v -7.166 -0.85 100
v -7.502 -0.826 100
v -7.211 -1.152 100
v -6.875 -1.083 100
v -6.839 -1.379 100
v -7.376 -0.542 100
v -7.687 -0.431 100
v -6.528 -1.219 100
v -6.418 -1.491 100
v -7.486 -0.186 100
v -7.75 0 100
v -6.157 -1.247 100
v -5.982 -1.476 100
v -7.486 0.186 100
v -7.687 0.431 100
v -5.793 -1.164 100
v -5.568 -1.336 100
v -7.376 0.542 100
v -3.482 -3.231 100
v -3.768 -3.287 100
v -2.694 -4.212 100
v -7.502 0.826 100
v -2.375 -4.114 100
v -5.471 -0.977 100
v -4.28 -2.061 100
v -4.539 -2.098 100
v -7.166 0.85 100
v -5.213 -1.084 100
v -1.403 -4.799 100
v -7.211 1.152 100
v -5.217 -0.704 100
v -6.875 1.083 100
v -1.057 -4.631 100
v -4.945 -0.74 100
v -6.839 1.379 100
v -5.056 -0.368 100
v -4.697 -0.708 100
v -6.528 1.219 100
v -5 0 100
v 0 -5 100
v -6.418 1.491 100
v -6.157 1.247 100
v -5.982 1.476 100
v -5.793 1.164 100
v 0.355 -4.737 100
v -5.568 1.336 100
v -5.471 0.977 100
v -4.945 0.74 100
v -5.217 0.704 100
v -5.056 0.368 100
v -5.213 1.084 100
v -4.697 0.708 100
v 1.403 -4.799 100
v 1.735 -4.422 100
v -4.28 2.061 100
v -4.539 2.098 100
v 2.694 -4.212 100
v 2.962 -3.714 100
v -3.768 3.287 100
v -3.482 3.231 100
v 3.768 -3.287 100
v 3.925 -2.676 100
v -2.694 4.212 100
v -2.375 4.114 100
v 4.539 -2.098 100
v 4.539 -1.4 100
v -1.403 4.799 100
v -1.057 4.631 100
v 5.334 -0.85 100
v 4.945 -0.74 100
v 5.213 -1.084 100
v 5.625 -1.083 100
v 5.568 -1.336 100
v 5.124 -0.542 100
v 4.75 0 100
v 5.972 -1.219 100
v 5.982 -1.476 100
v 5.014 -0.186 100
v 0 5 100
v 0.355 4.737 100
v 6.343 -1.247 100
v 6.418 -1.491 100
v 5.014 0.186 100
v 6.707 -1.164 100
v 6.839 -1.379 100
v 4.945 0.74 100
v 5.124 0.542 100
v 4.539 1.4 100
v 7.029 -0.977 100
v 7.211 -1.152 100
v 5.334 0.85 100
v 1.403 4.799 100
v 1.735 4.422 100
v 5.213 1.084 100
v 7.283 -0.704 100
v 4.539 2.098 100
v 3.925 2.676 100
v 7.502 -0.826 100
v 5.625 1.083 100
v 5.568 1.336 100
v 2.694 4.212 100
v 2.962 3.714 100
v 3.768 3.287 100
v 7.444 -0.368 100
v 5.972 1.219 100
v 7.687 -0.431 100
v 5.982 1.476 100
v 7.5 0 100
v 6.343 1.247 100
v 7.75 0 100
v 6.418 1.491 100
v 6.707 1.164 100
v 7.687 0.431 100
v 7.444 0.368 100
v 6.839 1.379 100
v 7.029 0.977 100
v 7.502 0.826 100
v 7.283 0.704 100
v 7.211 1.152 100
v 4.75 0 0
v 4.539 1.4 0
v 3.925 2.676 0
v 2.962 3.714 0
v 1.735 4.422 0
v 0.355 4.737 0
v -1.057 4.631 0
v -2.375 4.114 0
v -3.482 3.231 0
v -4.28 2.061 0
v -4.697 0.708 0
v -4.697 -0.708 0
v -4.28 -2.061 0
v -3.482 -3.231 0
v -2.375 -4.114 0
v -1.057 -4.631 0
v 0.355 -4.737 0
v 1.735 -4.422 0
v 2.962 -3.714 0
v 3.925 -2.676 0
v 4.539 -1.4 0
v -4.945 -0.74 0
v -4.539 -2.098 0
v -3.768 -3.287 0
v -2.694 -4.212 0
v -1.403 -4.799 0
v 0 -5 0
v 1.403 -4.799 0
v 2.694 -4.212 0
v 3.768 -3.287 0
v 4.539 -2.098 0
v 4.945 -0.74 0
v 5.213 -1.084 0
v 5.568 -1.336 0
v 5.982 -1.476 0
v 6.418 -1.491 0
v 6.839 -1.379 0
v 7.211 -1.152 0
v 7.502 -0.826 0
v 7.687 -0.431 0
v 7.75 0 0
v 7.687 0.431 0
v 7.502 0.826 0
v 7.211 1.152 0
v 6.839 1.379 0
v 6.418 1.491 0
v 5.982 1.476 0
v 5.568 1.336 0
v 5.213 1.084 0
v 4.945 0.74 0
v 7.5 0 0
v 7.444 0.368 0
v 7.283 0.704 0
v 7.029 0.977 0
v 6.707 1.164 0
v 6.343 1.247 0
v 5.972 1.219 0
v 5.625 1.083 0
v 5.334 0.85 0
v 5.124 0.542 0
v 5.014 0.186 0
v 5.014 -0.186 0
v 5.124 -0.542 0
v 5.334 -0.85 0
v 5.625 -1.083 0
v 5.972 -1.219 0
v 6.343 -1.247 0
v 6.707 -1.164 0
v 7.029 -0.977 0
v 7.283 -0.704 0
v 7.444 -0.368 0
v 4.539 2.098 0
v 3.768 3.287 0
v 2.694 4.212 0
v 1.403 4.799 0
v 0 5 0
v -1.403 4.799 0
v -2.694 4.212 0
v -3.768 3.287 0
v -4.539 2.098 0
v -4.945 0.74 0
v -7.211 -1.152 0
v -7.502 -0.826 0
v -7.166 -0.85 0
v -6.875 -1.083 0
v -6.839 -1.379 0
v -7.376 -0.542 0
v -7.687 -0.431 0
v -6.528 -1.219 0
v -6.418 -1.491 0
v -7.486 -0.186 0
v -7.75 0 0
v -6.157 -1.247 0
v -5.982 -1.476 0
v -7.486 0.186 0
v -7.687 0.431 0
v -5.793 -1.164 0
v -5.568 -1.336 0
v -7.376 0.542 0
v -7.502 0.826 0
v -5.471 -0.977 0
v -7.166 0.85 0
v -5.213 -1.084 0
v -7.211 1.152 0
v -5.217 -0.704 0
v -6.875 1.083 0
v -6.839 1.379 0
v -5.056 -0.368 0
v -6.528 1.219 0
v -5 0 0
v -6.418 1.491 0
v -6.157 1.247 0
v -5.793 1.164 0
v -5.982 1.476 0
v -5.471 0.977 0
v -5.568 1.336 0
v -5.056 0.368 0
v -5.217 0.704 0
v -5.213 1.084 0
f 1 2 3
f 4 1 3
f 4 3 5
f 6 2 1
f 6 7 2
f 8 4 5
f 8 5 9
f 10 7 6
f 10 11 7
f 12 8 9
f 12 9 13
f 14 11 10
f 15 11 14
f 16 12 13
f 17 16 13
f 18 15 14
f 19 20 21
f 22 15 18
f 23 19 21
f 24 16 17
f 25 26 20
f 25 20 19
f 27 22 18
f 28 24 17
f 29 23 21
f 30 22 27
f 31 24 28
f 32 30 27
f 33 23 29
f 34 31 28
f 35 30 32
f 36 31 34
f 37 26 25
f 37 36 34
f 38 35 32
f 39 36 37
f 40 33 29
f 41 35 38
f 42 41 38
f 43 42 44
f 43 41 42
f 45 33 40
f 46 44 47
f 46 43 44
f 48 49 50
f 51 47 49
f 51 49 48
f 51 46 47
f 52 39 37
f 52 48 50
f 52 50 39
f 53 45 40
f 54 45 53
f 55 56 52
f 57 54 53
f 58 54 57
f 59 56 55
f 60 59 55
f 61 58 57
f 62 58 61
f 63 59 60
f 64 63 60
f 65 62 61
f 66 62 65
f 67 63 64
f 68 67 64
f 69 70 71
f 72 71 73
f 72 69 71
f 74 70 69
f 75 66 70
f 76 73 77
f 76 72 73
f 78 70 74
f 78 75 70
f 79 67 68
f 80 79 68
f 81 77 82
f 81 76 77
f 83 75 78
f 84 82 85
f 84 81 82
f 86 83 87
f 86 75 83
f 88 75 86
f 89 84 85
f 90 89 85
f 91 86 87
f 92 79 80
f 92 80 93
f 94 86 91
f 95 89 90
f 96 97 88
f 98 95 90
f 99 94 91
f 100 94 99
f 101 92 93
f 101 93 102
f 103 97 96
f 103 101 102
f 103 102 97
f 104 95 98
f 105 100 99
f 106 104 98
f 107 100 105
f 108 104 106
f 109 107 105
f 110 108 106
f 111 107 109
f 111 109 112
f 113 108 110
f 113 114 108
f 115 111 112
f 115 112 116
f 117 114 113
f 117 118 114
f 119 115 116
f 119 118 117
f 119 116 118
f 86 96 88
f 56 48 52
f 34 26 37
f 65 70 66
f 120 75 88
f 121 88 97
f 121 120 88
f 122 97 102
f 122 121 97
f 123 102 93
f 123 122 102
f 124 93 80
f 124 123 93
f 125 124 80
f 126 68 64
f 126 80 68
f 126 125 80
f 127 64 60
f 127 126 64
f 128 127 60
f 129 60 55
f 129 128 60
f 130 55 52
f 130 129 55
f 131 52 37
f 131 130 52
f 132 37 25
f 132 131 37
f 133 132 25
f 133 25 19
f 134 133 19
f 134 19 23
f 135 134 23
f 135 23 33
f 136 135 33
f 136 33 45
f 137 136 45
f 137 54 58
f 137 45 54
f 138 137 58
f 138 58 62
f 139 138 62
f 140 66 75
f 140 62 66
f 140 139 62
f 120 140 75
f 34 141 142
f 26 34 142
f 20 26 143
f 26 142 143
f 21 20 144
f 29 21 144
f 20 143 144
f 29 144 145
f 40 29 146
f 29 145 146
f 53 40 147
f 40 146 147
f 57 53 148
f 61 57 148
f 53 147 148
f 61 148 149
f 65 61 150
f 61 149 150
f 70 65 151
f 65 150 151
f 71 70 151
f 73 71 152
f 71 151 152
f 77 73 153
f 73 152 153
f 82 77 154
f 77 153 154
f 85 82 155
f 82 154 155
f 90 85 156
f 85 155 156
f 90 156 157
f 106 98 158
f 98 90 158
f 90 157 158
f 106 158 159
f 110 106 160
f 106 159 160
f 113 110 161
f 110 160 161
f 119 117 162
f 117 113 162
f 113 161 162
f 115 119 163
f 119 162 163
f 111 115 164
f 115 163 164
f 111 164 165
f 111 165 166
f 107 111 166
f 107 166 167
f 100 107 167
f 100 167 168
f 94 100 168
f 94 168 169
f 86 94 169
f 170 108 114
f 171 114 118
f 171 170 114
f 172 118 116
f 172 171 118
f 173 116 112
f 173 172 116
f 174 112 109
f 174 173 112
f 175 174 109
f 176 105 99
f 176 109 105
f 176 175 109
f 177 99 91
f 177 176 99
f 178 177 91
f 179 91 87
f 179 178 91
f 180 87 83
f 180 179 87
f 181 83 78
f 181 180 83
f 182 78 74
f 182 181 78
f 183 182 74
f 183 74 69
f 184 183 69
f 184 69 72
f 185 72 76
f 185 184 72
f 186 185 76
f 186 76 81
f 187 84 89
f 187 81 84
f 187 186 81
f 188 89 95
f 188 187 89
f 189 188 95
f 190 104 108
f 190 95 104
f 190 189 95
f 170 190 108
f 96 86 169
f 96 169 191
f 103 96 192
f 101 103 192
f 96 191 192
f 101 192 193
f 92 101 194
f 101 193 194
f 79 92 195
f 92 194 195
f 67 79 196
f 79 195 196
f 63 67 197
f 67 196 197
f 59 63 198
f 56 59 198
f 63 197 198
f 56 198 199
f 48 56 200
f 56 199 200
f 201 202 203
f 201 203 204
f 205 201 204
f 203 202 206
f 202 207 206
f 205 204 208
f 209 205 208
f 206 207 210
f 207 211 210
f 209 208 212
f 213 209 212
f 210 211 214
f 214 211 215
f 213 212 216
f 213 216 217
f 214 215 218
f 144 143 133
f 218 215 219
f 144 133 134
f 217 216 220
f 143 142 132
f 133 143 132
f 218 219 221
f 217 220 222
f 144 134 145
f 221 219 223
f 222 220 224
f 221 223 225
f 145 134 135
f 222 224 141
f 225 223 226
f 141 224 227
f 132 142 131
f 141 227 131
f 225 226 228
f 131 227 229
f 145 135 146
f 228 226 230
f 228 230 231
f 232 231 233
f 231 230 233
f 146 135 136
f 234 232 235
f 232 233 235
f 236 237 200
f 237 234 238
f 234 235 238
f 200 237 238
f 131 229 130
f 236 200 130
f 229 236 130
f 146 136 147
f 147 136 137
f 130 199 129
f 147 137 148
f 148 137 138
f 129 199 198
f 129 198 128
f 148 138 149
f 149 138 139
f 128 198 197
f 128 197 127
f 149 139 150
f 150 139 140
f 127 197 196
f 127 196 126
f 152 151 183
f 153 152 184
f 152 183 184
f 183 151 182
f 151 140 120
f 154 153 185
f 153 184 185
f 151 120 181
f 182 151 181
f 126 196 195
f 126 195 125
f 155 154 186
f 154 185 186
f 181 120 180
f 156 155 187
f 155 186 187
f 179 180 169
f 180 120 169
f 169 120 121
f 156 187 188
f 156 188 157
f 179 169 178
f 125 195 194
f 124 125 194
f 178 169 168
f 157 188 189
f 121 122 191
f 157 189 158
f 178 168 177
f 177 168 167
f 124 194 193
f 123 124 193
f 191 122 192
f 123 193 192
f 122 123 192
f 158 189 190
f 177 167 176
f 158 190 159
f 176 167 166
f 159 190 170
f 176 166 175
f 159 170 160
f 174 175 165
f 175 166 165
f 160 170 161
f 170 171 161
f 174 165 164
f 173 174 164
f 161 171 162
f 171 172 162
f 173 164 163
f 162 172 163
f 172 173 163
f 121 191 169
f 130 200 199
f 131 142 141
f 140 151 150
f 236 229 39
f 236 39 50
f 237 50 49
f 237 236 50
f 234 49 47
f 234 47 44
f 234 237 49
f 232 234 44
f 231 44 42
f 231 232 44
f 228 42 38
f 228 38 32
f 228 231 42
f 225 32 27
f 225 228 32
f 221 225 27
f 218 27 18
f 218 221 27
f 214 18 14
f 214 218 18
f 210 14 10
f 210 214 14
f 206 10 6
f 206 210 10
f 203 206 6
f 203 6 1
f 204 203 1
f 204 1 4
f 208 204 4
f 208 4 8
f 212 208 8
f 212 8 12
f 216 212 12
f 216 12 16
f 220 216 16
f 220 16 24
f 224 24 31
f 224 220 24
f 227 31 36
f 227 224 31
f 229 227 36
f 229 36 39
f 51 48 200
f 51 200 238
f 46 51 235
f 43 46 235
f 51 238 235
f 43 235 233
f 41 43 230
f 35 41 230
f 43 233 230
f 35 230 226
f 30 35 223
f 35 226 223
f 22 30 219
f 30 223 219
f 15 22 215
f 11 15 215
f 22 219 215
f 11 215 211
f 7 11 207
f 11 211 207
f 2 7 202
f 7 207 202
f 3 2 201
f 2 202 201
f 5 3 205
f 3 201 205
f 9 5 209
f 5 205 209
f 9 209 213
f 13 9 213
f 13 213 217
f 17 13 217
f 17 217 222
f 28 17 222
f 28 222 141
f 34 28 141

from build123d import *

# Parameters (mm, degrees)
F0_R     = 5
F0_R_2   = 4.75
F1_DEPTH = 100
F2_R     = 1.5
F2_R_2   = 1.25
F3_DEPTH = 100


with BuildPart() as f1:
    # F0 (on Top) → F1 (new body)
    with BuildSketch(Plane.XY):
        Circle(F0_R)
        Circle(F0_R_2, mode=Mode.SUBTRACT)
    extrude(amount=F1_DEPTH)

    # F2 (on Top) → F3 (join, through all)
    with BuildSketch(Plane.XY):
        with Locations((6.25, 0)):
            Circle(F2_R)
        with Locations((6.25, 0)):
            Circle(F2_R_2, mode=Mode.SUBTRACT)
        with Locations((-6.25, 0)):
            Circle(F2_R)
        with Locations((-6.25, 0)):
            Circle(F2_R_2, mode=Mode.SUBTRACT)
    extrude(amount=F3_DEPTH)


solid = f1.part
